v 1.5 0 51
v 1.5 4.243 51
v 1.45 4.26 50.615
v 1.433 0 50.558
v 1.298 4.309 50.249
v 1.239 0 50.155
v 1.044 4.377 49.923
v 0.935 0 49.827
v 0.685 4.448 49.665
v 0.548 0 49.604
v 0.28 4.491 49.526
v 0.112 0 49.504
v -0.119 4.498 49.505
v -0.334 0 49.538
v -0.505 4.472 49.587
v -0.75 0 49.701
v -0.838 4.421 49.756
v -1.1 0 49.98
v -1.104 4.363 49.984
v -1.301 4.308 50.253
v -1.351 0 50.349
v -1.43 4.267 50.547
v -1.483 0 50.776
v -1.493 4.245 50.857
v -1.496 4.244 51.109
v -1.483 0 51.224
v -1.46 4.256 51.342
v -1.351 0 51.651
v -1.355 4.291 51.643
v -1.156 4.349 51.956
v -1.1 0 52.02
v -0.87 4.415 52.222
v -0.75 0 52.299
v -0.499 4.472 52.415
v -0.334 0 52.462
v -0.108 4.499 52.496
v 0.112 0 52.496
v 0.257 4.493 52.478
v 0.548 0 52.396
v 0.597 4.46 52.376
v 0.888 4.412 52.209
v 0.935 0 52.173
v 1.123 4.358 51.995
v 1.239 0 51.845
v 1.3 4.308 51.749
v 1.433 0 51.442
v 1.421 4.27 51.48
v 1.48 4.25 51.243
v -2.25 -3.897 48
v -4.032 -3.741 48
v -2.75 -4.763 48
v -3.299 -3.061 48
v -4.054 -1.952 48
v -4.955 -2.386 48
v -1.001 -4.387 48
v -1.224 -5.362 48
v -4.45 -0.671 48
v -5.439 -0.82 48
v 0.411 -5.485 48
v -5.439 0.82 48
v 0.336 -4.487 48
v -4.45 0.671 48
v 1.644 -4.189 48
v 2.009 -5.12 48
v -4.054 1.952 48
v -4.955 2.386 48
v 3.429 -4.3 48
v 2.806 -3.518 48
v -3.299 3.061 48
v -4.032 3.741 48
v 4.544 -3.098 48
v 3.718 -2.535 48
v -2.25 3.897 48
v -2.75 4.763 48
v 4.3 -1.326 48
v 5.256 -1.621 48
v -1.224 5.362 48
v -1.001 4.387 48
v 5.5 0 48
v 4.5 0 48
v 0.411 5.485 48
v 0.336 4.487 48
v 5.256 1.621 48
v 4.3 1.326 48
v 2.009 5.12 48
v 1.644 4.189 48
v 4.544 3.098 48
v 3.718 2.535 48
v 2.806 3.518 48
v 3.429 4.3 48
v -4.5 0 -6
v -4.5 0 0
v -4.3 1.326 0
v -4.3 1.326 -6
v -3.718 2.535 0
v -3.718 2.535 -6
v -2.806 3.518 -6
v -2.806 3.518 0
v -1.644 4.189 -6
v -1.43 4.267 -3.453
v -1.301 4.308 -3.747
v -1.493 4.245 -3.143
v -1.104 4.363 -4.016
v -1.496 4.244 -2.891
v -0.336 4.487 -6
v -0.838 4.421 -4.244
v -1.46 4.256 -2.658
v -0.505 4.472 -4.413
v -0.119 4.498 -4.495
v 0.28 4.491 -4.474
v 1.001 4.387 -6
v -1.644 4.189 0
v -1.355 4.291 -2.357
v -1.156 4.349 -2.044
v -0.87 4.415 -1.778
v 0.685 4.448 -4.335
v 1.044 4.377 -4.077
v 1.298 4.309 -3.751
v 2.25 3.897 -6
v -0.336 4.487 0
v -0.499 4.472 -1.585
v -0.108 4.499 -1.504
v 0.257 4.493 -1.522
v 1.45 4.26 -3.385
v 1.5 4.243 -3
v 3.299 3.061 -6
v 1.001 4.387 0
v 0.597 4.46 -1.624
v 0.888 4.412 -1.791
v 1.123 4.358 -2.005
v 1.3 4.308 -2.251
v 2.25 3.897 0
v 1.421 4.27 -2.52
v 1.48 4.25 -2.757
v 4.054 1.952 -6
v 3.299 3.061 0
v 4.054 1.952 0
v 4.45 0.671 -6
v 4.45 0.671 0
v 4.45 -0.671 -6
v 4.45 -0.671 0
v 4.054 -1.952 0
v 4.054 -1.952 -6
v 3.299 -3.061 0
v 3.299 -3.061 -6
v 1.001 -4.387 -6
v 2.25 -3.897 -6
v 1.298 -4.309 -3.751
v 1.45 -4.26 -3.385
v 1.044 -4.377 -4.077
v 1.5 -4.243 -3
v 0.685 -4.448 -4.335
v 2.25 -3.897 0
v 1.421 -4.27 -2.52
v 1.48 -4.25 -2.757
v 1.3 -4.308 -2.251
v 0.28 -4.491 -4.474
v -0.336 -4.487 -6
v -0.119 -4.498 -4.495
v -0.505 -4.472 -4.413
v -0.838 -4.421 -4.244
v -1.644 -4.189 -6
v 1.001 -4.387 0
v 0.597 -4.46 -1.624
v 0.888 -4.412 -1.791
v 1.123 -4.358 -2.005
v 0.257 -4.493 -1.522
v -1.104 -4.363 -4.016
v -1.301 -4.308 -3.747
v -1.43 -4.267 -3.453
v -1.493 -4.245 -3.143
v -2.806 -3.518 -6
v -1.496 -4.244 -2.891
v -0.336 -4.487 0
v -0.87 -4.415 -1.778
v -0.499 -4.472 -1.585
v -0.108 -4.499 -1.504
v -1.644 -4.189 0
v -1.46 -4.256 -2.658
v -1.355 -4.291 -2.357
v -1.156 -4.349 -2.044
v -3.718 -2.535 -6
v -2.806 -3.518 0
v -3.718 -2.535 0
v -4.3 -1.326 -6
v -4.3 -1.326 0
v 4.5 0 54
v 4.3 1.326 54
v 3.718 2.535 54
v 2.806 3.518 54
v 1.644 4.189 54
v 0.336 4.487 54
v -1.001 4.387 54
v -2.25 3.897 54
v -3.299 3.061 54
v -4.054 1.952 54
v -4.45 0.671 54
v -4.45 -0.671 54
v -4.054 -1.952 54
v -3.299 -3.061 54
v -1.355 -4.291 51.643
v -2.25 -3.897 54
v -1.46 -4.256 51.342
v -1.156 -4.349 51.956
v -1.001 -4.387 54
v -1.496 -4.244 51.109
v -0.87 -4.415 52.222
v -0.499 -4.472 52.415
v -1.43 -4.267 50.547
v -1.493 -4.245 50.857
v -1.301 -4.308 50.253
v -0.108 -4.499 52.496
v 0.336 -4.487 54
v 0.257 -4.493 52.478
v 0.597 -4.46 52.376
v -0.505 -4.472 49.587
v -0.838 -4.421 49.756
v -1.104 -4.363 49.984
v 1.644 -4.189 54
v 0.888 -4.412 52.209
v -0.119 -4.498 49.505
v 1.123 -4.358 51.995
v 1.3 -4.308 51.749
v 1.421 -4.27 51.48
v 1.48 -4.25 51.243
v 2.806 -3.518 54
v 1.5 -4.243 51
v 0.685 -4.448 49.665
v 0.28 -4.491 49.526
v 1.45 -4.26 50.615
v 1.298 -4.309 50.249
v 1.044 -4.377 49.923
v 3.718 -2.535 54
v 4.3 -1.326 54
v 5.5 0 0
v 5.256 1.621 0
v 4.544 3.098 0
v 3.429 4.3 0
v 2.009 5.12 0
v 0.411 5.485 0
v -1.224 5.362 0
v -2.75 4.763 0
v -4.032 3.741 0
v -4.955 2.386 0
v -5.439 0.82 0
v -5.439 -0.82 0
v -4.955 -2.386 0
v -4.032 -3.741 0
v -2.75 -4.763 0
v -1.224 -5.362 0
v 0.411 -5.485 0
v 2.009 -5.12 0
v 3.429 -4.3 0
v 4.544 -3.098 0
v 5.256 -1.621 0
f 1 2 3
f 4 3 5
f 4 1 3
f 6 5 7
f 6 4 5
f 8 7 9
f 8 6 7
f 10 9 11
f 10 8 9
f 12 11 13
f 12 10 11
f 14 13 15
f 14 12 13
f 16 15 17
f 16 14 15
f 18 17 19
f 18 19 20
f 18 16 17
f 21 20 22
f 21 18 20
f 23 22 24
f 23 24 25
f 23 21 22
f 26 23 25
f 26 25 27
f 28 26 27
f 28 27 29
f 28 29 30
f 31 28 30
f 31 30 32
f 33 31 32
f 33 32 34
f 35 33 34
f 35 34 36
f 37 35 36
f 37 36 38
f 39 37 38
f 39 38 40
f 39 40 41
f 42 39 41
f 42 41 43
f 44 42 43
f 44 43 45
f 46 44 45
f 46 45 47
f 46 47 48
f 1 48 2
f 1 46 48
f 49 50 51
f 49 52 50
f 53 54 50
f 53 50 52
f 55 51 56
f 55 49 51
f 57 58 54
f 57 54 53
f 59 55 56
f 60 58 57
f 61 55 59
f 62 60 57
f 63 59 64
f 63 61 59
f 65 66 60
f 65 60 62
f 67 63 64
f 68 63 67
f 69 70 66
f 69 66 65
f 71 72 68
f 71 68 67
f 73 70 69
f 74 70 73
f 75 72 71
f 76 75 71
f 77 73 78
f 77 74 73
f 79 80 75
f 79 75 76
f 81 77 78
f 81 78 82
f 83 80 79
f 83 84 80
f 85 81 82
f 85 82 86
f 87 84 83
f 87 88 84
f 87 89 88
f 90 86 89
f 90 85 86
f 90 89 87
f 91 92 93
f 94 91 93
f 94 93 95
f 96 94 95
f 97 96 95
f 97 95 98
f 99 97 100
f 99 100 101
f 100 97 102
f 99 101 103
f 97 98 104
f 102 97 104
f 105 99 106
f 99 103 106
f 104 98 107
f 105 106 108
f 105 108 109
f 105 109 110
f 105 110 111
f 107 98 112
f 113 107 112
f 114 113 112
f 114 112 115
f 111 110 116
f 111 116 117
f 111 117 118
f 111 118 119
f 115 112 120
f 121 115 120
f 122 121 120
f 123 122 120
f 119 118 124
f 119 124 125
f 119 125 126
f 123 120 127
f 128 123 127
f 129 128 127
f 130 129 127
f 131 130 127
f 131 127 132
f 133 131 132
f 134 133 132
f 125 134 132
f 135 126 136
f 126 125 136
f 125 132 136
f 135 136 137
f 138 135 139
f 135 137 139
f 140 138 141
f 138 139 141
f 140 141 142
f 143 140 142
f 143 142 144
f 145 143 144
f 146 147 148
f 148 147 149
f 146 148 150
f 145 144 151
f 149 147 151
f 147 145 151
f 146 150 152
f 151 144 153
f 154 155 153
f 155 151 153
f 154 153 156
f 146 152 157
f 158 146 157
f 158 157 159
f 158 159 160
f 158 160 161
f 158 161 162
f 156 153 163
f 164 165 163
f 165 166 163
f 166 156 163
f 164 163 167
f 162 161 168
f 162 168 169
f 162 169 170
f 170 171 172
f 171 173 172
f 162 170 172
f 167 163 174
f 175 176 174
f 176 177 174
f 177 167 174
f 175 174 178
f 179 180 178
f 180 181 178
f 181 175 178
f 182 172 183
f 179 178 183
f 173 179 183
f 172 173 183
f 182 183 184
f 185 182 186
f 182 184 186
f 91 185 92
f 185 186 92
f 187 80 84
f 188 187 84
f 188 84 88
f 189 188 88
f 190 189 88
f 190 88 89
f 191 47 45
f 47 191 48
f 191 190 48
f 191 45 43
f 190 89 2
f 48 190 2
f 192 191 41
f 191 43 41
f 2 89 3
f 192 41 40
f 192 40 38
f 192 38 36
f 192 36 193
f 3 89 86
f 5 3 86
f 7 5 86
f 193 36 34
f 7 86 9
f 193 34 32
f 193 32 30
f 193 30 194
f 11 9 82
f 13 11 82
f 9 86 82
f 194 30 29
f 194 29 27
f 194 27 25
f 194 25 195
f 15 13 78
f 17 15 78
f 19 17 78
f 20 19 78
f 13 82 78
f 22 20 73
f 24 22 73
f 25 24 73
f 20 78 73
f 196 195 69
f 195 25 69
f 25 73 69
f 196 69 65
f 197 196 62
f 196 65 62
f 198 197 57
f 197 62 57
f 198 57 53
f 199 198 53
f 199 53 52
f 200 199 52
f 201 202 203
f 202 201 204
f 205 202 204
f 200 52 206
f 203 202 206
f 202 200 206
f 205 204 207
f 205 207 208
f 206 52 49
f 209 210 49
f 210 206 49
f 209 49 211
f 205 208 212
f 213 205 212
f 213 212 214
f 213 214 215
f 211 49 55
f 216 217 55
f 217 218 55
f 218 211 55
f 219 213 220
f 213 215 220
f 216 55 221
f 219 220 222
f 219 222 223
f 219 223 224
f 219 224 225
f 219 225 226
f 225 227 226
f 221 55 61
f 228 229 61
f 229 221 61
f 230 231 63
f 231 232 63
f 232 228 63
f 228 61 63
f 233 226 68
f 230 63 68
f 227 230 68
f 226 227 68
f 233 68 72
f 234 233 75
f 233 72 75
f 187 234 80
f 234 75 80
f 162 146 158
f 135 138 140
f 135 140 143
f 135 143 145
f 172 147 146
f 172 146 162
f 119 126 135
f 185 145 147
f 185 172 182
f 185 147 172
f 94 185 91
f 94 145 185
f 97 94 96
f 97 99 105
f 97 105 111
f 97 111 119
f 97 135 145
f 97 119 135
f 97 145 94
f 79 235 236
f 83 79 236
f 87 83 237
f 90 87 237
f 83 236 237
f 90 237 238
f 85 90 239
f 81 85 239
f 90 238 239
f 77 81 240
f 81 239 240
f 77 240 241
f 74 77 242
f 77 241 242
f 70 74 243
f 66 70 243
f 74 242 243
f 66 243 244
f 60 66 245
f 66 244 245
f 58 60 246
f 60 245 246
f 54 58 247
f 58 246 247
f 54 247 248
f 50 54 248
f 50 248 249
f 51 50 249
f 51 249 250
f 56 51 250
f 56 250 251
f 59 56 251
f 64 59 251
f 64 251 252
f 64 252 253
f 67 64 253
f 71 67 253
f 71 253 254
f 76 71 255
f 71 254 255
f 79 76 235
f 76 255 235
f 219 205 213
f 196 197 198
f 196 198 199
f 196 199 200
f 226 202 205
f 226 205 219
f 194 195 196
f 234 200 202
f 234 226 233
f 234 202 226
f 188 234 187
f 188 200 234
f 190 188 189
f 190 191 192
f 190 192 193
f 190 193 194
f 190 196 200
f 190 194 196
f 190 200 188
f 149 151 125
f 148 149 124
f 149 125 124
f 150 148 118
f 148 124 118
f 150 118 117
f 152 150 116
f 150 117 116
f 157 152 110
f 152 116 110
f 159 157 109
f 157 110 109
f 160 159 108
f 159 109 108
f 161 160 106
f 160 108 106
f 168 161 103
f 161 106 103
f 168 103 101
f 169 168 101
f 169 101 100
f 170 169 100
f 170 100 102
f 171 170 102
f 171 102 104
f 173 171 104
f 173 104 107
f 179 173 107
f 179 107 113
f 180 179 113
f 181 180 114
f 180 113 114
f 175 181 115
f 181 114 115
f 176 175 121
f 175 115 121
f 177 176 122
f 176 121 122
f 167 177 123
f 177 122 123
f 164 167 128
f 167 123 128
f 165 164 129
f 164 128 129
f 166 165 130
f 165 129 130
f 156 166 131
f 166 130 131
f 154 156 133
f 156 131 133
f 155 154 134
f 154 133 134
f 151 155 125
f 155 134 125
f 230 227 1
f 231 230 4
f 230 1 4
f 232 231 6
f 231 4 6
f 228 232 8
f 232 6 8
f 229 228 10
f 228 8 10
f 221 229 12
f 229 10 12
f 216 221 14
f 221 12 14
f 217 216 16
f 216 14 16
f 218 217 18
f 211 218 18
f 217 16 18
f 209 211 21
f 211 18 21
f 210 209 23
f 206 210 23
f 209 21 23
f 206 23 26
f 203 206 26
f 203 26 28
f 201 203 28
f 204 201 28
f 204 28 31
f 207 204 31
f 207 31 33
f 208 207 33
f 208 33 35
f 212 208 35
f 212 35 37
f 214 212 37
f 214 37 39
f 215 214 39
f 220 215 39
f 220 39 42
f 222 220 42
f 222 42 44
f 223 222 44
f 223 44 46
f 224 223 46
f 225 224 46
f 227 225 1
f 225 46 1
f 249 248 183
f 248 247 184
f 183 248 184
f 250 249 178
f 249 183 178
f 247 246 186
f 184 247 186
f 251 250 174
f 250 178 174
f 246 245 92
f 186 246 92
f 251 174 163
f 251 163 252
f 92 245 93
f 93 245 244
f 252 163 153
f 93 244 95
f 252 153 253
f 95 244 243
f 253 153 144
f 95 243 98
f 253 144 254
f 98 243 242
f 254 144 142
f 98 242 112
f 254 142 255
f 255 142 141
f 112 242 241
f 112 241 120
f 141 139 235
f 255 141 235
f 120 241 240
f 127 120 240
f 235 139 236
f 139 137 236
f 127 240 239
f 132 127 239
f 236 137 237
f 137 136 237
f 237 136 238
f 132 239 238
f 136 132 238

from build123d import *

# Parameters (mm, degrees)
SKETCH1_R               = 5.5
BOSS_EXTRUDE1_DEPTH     = 48
SKETCH2_R               = 4.5
BOSS_EXTRUDE2_DEPTH     = 6
SKETCH3_R               = 4.5
BOSS_EXTRUDE3_DEPTH     = 6
SKETCH4_R               = 1.5
CUT_EXTRUDE1_DEPTH      = 6.5
CUT_EXTRUDE1_DEPTH_BACK = 6.5


with BuildPart() as part:
    # Sketch1 → Boss-Extrude1 (new body)
    with BuildSketch(Plane.XY):
        Circle(SKETCH1_R)
    extrude(amount=BOSS_EXTRUDE1_DEPTH)

    # Sketch2 → Boss-Extrude2 (add)
    with BuildSketch(Plane.XY.offset(48)):
        Circle(SKETCH2_R)
    extrude(amount=BOSS_EXTRUDE2_DEPTH)

    # Sketch3 → Boss-Extrude3 (add)
    with BuildSketch(Plane(origin=(0, 0, 0), x_dir=(-1, 0, 0), z_dir=(0, 0, -1))):
        Circle(SKETCH3_R)
    extrude(amount=BOSS_EXTRUDE3_DEPTH)

    # Sketch4 → Cut-Extrude1 (cut, two sides)
    with BuildSketch(Plane(origin=(0, 0, 0), x_dir=(1, 0, 0), z_dir=(0, 1, 0))) as cut_extrude1_sk:
        with Locations((0, 3)):
            Circle(SKETCH4_R)
        with Locations((0, -51)):
            Circle(SKETCH4_R)
    extrude(amount=CUT_EXTRUDE1_DEPTH, mode=Mode.SUBTRACT)
    extrude(cut_extrude1_sk.sketch, amount=-CUT_EXTRUDE1_DEPTH_BACK, mode=Mode.SUBTRACT)


solid = part.part
